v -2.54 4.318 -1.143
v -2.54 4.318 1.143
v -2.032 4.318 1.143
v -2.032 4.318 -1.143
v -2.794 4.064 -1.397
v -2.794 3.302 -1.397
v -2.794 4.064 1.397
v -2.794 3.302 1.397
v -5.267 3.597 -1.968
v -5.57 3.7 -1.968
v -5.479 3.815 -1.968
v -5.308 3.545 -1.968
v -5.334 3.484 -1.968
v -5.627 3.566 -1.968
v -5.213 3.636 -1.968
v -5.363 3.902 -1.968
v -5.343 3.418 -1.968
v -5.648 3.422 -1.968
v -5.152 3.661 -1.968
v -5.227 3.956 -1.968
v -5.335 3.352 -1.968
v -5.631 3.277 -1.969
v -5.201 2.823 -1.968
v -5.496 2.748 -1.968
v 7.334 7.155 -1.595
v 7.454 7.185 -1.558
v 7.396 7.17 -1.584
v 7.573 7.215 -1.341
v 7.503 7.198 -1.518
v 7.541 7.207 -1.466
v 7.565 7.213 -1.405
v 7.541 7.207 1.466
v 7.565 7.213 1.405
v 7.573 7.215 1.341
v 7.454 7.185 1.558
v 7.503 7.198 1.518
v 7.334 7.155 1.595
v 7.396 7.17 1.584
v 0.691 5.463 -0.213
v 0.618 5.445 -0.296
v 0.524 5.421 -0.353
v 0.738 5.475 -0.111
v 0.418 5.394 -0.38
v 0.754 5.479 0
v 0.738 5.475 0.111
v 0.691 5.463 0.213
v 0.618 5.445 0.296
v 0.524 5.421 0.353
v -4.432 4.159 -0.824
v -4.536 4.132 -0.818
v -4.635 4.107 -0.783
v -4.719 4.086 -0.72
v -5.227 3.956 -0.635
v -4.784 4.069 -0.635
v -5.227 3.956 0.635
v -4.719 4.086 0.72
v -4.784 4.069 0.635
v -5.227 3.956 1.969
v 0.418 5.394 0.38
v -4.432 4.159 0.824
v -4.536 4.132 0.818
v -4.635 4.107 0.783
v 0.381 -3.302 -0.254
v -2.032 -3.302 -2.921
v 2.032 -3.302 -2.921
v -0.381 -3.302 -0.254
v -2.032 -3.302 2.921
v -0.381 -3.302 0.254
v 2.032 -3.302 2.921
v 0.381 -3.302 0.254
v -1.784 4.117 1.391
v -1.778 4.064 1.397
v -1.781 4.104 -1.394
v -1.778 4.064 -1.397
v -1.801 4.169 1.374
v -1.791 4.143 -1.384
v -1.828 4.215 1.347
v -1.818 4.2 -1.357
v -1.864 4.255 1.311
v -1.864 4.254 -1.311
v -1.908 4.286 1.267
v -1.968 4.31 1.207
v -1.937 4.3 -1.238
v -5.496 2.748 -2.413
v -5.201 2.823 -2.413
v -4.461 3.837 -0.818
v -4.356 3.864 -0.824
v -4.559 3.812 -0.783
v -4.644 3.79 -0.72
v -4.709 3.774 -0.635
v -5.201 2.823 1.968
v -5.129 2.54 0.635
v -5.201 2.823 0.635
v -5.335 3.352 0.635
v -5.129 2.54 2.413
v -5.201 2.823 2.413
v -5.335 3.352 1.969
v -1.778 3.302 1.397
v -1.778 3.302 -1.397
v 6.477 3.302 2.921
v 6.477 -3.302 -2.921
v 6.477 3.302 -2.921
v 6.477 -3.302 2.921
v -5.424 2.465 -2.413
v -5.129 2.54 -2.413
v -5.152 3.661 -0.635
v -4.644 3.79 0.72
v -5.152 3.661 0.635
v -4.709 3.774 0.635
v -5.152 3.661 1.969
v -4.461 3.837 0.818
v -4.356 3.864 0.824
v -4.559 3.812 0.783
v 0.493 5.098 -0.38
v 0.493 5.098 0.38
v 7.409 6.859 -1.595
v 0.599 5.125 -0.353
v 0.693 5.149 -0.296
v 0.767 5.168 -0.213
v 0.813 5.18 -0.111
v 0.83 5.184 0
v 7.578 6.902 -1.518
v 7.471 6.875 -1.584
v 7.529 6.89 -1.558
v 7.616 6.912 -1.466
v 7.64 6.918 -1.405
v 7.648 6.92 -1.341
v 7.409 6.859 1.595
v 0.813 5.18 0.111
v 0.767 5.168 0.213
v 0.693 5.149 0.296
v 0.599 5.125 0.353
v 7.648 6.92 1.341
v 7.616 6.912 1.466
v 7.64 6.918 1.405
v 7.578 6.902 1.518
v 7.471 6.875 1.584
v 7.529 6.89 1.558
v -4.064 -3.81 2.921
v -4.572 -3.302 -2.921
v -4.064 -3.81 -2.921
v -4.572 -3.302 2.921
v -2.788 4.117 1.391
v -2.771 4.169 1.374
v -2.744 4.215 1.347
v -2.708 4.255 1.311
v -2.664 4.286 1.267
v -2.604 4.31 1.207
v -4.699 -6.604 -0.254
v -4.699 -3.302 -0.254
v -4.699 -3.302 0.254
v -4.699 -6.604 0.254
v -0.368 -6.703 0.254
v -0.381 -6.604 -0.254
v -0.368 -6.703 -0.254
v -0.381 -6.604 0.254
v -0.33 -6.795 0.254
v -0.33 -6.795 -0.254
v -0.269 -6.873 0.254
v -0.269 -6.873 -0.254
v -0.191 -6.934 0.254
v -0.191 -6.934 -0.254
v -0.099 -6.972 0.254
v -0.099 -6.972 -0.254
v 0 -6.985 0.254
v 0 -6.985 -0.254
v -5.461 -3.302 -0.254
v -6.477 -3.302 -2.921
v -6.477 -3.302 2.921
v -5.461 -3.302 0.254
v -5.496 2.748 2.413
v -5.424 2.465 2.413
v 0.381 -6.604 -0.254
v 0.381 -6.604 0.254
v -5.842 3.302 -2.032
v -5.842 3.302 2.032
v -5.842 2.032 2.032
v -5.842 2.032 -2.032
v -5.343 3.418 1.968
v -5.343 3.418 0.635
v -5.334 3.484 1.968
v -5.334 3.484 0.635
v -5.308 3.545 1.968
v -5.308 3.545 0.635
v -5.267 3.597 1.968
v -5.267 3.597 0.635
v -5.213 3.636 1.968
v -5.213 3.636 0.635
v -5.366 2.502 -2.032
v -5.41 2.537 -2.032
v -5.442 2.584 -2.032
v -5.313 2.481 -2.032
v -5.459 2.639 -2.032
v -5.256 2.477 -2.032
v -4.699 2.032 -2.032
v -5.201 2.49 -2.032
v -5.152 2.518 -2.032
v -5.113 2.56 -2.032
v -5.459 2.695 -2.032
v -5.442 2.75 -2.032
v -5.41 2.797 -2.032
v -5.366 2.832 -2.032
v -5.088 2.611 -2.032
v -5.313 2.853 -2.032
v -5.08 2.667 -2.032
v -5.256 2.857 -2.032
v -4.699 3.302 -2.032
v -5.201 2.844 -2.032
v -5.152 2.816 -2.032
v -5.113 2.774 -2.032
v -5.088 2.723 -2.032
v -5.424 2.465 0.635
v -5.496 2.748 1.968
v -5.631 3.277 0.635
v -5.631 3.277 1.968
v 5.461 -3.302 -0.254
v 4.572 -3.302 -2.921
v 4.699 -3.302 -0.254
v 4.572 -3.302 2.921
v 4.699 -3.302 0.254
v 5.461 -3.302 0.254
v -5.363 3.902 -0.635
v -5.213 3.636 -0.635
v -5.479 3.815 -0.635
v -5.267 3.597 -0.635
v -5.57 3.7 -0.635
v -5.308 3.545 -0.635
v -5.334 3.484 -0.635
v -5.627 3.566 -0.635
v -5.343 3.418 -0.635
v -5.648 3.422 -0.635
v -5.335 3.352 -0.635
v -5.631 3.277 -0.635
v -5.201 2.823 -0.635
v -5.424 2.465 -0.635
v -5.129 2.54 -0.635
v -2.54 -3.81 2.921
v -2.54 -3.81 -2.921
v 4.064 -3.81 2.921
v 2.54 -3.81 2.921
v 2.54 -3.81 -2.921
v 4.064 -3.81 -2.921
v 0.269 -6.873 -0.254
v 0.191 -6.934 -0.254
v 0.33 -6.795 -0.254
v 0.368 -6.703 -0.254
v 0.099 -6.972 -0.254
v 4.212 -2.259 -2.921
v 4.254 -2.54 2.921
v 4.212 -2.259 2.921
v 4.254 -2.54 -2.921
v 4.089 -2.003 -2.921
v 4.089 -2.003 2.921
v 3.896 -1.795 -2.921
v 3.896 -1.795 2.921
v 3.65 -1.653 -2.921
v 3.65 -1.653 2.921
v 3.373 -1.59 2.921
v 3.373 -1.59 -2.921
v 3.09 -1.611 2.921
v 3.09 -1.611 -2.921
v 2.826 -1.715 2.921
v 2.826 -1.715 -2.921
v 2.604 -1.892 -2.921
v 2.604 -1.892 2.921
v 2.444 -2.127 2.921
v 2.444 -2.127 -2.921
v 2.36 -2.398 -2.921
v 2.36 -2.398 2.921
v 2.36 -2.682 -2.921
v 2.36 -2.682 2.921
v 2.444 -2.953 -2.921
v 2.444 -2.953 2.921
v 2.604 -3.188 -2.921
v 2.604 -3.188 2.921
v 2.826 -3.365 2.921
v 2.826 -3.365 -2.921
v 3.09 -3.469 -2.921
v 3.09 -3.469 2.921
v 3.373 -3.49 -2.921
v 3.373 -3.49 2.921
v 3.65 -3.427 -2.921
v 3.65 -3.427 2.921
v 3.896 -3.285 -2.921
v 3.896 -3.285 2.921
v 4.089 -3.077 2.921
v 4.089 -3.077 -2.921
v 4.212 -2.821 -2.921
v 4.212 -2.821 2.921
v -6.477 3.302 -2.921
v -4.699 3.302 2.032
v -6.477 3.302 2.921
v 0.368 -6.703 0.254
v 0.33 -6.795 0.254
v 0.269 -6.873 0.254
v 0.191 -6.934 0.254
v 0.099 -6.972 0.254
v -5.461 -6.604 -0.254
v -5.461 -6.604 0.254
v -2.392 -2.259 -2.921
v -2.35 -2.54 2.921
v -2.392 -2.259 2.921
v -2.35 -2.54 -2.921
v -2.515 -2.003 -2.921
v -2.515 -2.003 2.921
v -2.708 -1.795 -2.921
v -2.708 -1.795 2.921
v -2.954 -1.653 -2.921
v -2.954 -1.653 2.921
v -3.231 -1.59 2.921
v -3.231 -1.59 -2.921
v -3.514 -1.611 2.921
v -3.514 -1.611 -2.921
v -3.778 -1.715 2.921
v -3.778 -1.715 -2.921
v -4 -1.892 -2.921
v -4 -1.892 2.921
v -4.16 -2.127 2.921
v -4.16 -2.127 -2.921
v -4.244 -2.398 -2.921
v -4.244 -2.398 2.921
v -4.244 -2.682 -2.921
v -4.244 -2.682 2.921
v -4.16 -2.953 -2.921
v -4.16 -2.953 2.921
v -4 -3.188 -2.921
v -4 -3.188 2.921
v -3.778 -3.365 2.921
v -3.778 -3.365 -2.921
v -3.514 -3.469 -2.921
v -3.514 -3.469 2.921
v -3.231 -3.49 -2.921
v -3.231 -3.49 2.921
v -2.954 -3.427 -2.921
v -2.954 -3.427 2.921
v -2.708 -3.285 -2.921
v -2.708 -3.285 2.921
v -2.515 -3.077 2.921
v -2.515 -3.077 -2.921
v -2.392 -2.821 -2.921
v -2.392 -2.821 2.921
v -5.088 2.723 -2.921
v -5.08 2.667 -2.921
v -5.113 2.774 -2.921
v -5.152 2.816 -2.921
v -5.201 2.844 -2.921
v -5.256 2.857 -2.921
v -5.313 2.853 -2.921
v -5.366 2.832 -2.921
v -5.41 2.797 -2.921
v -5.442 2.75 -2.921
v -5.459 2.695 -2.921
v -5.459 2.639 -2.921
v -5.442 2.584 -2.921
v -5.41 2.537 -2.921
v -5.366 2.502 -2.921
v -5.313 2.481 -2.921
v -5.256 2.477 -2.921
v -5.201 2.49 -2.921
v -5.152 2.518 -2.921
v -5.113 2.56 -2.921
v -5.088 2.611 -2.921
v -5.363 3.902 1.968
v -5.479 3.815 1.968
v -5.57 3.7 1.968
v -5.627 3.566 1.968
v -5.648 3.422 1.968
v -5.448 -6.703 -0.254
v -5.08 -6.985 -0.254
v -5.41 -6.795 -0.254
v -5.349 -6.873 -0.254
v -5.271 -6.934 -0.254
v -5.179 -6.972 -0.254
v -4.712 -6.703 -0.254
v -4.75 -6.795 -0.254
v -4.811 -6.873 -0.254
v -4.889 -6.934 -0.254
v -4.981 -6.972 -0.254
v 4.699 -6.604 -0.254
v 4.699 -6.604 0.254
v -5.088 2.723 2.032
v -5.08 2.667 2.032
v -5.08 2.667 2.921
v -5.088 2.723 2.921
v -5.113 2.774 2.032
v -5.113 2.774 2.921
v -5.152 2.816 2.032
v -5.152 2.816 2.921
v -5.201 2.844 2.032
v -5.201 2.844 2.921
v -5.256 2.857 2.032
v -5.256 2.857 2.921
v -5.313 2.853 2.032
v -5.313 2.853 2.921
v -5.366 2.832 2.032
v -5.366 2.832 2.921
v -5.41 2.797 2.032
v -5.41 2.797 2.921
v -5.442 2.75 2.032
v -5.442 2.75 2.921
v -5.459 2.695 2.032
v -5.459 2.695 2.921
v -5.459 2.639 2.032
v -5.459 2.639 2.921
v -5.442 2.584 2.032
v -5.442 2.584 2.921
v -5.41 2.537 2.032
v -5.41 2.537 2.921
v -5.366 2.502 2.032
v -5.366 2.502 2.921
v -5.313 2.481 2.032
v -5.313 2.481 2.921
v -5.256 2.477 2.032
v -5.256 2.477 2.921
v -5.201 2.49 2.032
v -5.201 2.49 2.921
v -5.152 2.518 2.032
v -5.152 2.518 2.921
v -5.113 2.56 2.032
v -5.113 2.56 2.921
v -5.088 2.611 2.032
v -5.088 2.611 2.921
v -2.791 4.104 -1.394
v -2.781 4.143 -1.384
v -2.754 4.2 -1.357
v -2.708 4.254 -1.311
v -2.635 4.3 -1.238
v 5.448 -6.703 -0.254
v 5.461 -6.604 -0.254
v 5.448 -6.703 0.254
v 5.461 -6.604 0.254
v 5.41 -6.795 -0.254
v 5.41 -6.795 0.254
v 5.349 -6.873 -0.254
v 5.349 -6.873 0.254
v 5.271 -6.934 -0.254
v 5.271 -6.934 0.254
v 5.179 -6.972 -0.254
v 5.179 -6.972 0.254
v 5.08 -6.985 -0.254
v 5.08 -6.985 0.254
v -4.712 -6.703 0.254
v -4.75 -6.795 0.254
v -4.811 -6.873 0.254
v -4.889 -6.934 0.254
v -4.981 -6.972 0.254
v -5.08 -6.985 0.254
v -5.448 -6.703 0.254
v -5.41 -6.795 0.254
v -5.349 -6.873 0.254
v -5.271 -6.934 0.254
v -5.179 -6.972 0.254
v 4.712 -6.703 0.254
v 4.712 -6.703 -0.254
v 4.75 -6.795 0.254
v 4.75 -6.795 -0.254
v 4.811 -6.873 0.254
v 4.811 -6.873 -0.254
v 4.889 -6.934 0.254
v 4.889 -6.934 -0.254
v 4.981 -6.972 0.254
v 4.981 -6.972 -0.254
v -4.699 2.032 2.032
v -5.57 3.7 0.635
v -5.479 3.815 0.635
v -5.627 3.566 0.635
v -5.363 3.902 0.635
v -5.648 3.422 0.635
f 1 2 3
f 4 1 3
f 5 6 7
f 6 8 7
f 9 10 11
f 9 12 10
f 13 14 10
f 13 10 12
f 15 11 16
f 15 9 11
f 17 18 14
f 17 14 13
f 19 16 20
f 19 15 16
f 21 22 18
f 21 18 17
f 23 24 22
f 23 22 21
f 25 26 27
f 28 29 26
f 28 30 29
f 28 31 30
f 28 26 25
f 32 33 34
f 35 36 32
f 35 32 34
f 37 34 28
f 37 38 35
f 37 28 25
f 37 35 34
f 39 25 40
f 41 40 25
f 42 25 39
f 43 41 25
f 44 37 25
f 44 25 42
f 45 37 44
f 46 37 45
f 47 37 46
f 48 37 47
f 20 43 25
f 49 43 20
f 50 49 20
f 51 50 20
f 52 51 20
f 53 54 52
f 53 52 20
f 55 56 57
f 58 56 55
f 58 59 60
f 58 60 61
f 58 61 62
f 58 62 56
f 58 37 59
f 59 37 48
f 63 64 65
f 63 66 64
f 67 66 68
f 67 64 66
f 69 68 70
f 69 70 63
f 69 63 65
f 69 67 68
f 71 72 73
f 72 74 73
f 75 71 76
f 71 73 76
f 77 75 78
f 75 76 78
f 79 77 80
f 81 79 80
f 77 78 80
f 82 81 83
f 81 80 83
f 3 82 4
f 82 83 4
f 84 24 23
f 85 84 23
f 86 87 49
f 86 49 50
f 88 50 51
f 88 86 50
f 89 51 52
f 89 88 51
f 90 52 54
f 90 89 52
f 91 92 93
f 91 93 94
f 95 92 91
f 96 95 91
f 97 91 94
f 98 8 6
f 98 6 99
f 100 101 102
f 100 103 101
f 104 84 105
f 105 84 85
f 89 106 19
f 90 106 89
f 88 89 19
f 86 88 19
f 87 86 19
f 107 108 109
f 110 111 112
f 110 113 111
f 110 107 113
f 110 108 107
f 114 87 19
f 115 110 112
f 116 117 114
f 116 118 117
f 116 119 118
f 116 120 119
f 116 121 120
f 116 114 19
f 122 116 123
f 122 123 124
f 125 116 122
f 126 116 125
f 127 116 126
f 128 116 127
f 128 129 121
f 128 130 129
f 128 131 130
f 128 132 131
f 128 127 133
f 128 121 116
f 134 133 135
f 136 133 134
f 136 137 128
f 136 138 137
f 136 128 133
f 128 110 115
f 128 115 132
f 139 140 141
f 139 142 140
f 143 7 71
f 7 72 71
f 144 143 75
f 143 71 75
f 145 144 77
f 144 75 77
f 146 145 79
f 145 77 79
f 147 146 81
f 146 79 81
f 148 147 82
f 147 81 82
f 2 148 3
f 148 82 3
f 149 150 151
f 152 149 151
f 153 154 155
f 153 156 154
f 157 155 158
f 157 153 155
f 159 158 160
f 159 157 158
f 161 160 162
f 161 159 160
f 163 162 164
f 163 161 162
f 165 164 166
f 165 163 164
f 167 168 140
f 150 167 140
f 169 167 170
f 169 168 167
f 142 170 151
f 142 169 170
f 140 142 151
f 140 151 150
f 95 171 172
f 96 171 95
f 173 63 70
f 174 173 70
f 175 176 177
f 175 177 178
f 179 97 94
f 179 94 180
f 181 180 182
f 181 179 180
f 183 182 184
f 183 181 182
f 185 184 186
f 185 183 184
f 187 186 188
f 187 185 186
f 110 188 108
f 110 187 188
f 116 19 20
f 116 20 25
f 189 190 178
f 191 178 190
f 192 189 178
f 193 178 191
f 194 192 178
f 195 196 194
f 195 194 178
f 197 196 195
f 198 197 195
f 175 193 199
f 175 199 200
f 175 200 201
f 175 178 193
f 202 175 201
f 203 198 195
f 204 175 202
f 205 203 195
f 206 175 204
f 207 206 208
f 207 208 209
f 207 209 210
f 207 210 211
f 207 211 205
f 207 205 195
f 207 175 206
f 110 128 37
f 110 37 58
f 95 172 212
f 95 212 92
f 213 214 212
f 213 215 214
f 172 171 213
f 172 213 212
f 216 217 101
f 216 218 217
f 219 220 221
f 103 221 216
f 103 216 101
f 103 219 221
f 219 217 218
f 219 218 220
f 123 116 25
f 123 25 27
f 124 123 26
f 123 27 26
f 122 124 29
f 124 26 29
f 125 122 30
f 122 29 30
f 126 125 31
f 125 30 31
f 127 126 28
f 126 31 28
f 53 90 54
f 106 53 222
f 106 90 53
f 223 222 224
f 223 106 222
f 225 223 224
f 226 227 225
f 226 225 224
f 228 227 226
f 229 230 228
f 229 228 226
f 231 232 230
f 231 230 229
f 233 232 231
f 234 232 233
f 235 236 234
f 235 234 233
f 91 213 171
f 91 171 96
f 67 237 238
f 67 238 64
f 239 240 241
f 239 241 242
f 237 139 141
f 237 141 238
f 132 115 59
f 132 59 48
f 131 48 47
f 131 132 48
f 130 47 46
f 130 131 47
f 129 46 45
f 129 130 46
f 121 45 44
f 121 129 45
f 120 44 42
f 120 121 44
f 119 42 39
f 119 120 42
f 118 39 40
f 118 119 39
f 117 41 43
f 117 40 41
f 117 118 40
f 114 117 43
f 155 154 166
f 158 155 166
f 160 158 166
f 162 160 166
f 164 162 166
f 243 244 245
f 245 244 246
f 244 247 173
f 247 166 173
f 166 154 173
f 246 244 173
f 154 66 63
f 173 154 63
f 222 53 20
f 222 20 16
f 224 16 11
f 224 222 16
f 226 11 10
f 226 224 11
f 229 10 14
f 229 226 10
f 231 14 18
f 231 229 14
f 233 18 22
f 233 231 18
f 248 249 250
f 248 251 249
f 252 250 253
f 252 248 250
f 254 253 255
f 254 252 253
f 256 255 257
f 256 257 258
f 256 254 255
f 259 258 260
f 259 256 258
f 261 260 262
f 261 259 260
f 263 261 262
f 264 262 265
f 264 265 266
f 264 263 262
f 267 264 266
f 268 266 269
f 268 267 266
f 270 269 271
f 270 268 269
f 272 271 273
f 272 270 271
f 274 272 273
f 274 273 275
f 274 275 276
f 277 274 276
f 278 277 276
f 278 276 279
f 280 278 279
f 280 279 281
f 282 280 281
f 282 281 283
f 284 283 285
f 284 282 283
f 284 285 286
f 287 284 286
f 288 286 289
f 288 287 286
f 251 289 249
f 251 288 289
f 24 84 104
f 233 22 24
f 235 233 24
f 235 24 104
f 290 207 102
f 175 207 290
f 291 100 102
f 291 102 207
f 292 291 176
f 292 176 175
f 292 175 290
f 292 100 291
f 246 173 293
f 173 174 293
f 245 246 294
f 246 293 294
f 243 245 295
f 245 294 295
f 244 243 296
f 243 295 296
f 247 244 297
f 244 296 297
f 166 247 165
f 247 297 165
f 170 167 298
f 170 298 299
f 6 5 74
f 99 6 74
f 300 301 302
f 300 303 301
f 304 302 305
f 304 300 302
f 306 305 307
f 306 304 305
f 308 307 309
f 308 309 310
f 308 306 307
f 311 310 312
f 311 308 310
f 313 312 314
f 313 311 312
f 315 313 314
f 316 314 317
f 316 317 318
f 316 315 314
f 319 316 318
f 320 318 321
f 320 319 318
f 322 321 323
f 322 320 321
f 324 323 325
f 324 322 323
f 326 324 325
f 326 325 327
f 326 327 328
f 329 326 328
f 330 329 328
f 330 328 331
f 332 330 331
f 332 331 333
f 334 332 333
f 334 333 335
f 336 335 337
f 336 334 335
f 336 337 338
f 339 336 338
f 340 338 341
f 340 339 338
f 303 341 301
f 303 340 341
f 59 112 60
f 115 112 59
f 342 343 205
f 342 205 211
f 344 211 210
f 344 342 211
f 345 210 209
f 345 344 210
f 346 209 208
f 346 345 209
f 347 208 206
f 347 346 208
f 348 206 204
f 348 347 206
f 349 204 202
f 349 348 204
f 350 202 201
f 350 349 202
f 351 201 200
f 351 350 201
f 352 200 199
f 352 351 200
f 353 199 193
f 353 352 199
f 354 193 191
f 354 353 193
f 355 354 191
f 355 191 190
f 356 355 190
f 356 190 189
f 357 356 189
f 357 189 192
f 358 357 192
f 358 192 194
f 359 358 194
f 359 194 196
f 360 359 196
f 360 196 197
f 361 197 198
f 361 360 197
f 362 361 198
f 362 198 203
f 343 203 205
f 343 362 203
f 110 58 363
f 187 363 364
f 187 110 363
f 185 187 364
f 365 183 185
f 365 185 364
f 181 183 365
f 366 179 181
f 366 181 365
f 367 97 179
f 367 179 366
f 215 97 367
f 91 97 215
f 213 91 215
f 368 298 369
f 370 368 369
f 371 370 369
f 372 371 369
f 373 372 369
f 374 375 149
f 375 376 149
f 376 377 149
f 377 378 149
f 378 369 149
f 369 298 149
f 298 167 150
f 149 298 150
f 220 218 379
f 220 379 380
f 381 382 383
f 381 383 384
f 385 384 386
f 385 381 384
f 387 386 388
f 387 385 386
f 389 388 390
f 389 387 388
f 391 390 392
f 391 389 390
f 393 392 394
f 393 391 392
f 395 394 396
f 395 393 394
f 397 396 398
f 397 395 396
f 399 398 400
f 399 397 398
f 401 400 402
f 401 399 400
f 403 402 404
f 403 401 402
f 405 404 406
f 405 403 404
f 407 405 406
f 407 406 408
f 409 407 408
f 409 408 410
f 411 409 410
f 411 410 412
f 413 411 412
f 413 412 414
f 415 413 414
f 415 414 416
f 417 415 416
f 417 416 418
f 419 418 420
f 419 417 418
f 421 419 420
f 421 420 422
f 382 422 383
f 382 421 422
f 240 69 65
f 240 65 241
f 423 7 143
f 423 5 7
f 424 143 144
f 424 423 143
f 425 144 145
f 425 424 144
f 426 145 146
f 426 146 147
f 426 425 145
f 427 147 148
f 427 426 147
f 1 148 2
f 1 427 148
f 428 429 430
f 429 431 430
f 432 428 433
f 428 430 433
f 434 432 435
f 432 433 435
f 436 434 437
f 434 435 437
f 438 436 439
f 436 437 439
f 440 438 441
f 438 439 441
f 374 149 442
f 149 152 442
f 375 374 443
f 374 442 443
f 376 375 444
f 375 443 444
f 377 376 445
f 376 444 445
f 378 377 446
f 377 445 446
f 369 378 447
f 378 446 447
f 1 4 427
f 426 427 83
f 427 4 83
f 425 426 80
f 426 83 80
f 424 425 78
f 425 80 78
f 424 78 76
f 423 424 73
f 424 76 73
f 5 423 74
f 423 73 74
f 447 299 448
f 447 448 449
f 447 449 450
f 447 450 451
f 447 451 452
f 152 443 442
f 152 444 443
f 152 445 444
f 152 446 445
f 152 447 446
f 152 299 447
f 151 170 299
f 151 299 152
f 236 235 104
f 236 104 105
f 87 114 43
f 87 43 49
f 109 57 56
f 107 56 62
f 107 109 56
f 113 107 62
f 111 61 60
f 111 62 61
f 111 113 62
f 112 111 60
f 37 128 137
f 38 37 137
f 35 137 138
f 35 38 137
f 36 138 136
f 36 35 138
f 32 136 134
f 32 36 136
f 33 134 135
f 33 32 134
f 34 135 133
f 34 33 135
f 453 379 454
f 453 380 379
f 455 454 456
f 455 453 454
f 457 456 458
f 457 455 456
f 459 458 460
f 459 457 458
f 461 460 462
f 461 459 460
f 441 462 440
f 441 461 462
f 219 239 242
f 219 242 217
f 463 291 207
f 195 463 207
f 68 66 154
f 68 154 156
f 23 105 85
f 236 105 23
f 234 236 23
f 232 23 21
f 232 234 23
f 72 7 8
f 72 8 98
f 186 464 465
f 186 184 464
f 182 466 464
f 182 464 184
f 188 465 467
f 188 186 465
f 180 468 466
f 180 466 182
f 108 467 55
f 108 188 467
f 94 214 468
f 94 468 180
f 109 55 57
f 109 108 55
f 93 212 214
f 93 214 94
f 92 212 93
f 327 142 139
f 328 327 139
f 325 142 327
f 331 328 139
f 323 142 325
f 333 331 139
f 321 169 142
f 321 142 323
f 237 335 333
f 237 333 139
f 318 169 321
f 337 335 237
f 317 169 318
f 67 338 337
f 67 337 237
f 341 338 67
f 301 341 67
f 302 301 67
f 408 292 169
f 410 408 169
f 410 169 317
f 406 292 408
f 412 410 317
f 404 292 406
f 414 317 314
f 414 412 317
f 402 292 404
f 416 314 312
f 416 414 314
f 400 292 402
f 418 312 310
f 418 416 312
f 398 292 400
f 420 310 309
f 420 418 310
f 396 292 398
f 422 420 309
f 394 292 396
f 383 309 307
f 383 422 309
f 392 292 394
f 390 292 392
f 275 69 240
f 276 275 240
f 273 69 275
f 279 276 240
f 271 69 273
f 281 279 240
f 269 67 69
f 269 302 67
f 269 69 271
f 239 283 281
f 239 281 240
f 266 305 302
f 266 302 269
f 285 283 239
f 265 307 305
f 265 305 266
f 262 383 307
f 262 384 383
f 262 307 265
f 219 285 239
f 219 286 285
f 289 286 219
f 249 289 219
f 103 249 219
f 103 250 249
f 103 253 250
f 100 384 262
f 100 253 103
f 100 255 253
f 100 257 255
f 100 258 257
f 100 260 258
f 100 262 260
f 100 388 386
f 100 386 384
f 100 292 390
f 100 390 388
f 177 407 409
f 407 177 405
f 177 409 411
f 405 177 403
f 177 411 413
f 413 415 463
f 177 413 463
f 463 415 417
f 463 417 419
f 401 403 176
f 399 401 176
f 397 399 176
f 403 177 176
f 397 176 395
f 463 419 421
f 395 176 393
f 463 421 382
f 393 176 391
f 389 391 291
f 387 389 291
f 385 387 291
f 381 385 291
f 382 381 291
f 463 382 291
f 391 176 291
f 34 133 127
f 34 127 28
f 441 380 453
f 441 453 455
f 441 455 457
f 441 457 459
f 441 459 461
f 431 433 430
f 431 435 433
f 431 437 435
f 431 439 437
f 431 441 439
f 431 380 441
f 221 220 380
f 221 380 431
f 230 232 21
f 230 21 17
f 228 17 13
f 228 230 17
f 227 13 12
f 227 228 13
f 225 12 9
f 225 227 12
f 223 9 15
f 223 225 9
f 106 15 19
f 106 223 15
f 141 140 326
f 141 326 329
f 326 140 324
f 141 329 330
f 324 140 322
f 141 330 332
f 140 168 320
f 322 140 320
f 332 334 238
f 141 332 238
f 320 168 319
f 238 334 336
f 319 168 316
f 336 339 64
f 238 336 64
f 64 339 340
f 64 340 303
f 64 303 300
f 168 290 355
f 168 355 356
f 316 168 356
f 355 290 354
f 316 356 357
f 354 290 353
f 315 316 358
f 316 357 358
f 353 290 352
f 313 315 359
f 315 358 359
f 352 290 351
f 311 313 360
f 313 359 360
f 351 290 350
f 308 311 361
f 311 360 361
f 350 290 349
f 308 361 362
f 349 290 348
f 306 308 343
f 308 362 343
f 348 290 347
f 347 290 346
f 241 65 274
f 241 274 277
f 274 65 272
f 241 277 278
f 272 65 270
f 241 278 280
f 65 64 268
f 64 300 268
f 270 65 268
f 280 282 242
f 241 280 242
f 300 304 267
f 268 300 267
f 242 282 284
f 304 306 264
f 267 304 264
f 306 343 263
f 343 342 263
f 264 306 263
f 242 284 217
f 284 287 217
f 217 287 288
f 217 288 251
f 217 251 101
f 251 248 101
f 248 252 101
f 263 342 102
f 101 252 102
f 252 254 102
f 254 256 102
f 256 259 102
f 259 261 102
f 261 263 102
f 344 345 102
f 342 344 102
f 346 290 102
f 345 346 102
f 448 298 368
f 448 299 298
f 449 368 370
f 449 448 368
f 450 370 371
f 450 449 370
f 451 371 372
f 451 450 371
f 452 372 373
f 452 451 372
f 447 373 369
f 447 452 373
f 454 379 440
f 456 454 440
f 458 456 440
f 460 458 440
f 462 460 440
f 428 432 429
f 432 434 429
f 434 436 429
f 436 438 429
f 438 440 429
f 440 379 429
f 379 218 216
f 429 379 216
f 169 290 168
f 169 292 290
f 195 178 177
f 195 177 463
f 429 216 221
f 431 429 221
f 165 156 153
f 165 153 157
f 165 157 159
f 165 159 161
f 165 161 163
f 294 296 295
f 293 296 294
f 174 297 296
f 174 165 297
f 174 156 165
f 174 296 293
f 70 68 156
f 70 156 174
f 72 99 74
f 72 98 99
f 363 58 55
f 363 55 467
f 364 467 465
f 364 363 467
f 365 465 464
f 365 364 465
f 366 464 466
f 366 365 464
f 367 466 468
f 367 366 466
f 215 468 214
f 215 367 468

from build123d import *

# Parameters (mm, degrees)
SKETCH1_R               = 0.9525
BOSS_EXTRUDE1_DEPTH     = 2.921
SKETCH4_W               = 0.762
SKETCH4_H               = 0.508
BOSS_EXTRUDE2_DEPTH     = 3.683
FILLET1_R               = 0.381
SKETCH5_W               = 1.143
SKETCH5_H               = 4.064
CUT_EXTRUDE1_DEPTH      = 1.27
CUT_EXTRUDE2_DEPTH      = 10.963633624
CUT_EXTRUDE2_DEPTH_BACK = 10.963633624
SKETCH7_R               = 0.1905
SKETCH8_W               = 1.016
SKETCH8_H               = 1.016
BOSS_EXTRUDE3_DEPTH     = 1.397
FILLET2_R               = 0.254
EXTRUDE_THIN1_DEPTH     = 2.413
CUT_EXTRUDE3_DEPTH      = 4.826
SKETCH12_W              = 0.3048
SKETCH12_H              = 1.27
CUT_EXTRUDE4_DEPTH      = 0.2921
FILLET3_R               = 0.254


with BuildPart() as part:
    # Sketch1 → Boss-Extrude1 (new, symmetric)
    with BuildSketch(Plane.XY):
        Polygon((-4.572, -3.302), (-4.064, -3.81), (-2.54, -3.81), (-2.032, -3.302), (2.032, -3.302), (2.54, -3.81), (4.064, -3.81), (4.572, -3.302), (6.477, -3.302), (6.477, 3.302), (-6.477, 3.302), (-6.477, -3.302), align=None)
        with Locations((3.302, -2.54)):
            Circle(SKETCH1_R, mode=Mode.SUBTRACT)
        with Locations((-3.302, -2.54)):
            Circle(SKETCH1_R, mode=Mode.SUBTRACT)
    extrude(amount=BOSS_EXTRUDE1_DEPTH, both=True)

    # Sketch4 → Boss-Extrude2 (add)
    with BuildSketch(Plane.XZ.offset(3.302)):
        with Locations((-5.08, 0)):
            Rectangle(SKETCH4_W, SKETCH4_H)
        Rectangle(SKETCH4_W, SKETCH4_H)
        with Locations((5.08, 0)):
            Rectangle(SKETCH4_W, SKETCH4_H)
    extrude(amount=BOSS_EXTRUDE2_DEPTH)

    # Fillet1
    fillet1_edges = [part.edges().sort_by_distance(p)[0] for p in [
        (-5.461, -6.985, 0),
        (-4.699, -6.985, 0),
        (-0.381, -6.985, 0),
        (0.381, -6.985, 0),
        (4.699, -6.985, 0),
        (5.461, -6.985, 0),
    ]]
    fillet(fillet1_edges, radius=FILLET1_R - 0.0001)  # a hair under: the kernel refuses the full size

    # Sketch5 → Cut-Extrude1 (cut)
    with BuildSketch(Plane(origin=(0, 3.302, 0), x_dir=(1, 0, 0), z_dir=(0, 1, 0))):
        with Locations((-5.2705, 0)):
            Rectangle(SKETCH5_W, SKETCH5_H)
    extrude(amount=-CUT_EXTRUDE1_DEPTH, mode=Mode.SUBTRACT)

    # Sketch7 → Cut-Extrude2 (cut, two sides: drawn at the far end of the back side and taken through both)
    with BuildSketch(Plane.XY.offset(-CUT_EXTRUDE2_DEPTH_BACK)):
        with Locations((-5.2705, 2.667)):
            Circle(SKETCH7_R)
    extrude(amount=CUT_EXTRUDE2_DEPTH + CUT_EXTRUDE2_DEPTH_BACK, mode=Mode.SUBTRACT)


with BuildPart() as body_2:
    # Sketch8 → Boss-Extrude3 (new, symmetric)
    with BuildSketch(Plane.XY):
        with Locations((-2.286, 3.81)):
            Rectangle(SKETCH8_W, SKETCH8_H)
    extrude(amount=BOSS_EXTRUDE3_DEPTH, both=True)

    # Fillet2
    fillet2_edges = [body_2.edges().sort_by_distance(p)[0] for p in [
        (-2.286, 4.318, 1.397),
        (-2.286, 4.318, -1.397),
        (-1.778, 4.318, 0),
        (-2.794, 4.318, 0),
    ]]
    fillet(fillet2_edges, radius=FILLET2_R)


with BuildPart() as body_3:
    # Sketch9 → Extrude-Thin1 (new, symmetric)
    with BuildSketch(Plane.XY):
        with BuildLine():
            Line((-5.128509683, 2.54), (-5.335324802, 3.352284893))
            ThreePointArc((-5.335324802, 3.352284893), (-5.307545297, 3.544693045), (-5.151849113, 3.661103078))
            Line((-5.151849113, 3.661103078), (7.64779162, 6.920007972))
            Line((7.64779162, 6.920007972), (7.572586123, 7.215384297))
            Line((7.572586123, 7.215384297), (-5.22705461, 3.956479402))
            ThreePointArc((-5.22705461, 3.956479402), (-5.569586217, 3.700377329), (-5.630701126, 3.277079395))
            Line((-5.630701126, 3.277079395), (-5.423886008, 2.464794502))
            Line((-5.423886008, 2.464794502), (-5.128509683, 2.54))
        make_face()
    extrude(amount=EXTRUDE_THIN1_DEPTH, both=True)

    # Sketch10 → Cut-Extrude3 (cut)
    with BuildSketch(Plane(origin=(-0.991627781, 3.894706889, 0), x_dir=(-0.9690824297997345, -0.24673719673661426, 0), z_dir=(0.24673719673661426, -0.9690824297997345, 0))):
        Polygon((4.648036146, 1.9685), (4.089236146, 1.9685), (-9.118763854, 1.5875), (-9.118763854, 2.413), (4.648036146, 2.413), align=None)
        Polygon((-9.118763854, -1.5875), (4.089236146, -1.9685), (4.648036146, -1.9685), (4.648036146, -2.413), (-9.118763854, -2.413), align=None)
        with BuildLine():
            Line((4.648036146, -0.635), (3.632036146, -0.635))
            ThreePointArc((3.632036146, -0.635), (3.477782055, -0.78256797), (3.268369677, -0.824005708))
            Line((3.268369677, -0.824005708), (-1.735674644, -0.379505708))
            ThreePointArc((-1.735674644, -0.379505708), (-2.082963854, 0), (-1.735674644, 0.379505708))
            Line((-1.735674644, 0.379505708), (3.268369677, 0.824005708))
            ThreePointArc((3.268369677, 0.824005708), (3.477782055, 0.78256797), (3.632036146, 0.635))
            Line((3.632036146, 0.635), (4.648036146, 0.635))
            Line((4.648036146, 0.635), (4.648036146, -0.635))
        make_face()
    extrude(amount=-CUT_EXTRUDE3_DEPTH, mode=Mode.SUBTRACT)

    # Sketch12 → Cut-Extrude4 (cut)
    with BuildSketch(Plane(origin=(-0.991627781, 3.894706889, 0), x_dir=(0.9690824297997345, 0.24673719673661426, 0), z_dir=(-0.24673719673661426, 0.9690824297997345, 0))):
        with Locations((-4.495636146, 0)):
            Rectangle(SKETCH12_W, SKETCH12_H)
    extrude(amount=-CUT_EXTRUDE4_DEPTH, mode=Mode.SUBTRACT)

    # Fillet3
    fillet3_edges = [body_3.edges().sort_by_distance(p)[0] for p in [
        (7.610188871, 7.067696135, -1.5875),
        (7.610188871, 7.067696135, 1.5875),
    ]]
    fillet(fillet3_edges, radius=FILLET3_R)


solid = Compound([part.part, body_2.part, body_3.part])
